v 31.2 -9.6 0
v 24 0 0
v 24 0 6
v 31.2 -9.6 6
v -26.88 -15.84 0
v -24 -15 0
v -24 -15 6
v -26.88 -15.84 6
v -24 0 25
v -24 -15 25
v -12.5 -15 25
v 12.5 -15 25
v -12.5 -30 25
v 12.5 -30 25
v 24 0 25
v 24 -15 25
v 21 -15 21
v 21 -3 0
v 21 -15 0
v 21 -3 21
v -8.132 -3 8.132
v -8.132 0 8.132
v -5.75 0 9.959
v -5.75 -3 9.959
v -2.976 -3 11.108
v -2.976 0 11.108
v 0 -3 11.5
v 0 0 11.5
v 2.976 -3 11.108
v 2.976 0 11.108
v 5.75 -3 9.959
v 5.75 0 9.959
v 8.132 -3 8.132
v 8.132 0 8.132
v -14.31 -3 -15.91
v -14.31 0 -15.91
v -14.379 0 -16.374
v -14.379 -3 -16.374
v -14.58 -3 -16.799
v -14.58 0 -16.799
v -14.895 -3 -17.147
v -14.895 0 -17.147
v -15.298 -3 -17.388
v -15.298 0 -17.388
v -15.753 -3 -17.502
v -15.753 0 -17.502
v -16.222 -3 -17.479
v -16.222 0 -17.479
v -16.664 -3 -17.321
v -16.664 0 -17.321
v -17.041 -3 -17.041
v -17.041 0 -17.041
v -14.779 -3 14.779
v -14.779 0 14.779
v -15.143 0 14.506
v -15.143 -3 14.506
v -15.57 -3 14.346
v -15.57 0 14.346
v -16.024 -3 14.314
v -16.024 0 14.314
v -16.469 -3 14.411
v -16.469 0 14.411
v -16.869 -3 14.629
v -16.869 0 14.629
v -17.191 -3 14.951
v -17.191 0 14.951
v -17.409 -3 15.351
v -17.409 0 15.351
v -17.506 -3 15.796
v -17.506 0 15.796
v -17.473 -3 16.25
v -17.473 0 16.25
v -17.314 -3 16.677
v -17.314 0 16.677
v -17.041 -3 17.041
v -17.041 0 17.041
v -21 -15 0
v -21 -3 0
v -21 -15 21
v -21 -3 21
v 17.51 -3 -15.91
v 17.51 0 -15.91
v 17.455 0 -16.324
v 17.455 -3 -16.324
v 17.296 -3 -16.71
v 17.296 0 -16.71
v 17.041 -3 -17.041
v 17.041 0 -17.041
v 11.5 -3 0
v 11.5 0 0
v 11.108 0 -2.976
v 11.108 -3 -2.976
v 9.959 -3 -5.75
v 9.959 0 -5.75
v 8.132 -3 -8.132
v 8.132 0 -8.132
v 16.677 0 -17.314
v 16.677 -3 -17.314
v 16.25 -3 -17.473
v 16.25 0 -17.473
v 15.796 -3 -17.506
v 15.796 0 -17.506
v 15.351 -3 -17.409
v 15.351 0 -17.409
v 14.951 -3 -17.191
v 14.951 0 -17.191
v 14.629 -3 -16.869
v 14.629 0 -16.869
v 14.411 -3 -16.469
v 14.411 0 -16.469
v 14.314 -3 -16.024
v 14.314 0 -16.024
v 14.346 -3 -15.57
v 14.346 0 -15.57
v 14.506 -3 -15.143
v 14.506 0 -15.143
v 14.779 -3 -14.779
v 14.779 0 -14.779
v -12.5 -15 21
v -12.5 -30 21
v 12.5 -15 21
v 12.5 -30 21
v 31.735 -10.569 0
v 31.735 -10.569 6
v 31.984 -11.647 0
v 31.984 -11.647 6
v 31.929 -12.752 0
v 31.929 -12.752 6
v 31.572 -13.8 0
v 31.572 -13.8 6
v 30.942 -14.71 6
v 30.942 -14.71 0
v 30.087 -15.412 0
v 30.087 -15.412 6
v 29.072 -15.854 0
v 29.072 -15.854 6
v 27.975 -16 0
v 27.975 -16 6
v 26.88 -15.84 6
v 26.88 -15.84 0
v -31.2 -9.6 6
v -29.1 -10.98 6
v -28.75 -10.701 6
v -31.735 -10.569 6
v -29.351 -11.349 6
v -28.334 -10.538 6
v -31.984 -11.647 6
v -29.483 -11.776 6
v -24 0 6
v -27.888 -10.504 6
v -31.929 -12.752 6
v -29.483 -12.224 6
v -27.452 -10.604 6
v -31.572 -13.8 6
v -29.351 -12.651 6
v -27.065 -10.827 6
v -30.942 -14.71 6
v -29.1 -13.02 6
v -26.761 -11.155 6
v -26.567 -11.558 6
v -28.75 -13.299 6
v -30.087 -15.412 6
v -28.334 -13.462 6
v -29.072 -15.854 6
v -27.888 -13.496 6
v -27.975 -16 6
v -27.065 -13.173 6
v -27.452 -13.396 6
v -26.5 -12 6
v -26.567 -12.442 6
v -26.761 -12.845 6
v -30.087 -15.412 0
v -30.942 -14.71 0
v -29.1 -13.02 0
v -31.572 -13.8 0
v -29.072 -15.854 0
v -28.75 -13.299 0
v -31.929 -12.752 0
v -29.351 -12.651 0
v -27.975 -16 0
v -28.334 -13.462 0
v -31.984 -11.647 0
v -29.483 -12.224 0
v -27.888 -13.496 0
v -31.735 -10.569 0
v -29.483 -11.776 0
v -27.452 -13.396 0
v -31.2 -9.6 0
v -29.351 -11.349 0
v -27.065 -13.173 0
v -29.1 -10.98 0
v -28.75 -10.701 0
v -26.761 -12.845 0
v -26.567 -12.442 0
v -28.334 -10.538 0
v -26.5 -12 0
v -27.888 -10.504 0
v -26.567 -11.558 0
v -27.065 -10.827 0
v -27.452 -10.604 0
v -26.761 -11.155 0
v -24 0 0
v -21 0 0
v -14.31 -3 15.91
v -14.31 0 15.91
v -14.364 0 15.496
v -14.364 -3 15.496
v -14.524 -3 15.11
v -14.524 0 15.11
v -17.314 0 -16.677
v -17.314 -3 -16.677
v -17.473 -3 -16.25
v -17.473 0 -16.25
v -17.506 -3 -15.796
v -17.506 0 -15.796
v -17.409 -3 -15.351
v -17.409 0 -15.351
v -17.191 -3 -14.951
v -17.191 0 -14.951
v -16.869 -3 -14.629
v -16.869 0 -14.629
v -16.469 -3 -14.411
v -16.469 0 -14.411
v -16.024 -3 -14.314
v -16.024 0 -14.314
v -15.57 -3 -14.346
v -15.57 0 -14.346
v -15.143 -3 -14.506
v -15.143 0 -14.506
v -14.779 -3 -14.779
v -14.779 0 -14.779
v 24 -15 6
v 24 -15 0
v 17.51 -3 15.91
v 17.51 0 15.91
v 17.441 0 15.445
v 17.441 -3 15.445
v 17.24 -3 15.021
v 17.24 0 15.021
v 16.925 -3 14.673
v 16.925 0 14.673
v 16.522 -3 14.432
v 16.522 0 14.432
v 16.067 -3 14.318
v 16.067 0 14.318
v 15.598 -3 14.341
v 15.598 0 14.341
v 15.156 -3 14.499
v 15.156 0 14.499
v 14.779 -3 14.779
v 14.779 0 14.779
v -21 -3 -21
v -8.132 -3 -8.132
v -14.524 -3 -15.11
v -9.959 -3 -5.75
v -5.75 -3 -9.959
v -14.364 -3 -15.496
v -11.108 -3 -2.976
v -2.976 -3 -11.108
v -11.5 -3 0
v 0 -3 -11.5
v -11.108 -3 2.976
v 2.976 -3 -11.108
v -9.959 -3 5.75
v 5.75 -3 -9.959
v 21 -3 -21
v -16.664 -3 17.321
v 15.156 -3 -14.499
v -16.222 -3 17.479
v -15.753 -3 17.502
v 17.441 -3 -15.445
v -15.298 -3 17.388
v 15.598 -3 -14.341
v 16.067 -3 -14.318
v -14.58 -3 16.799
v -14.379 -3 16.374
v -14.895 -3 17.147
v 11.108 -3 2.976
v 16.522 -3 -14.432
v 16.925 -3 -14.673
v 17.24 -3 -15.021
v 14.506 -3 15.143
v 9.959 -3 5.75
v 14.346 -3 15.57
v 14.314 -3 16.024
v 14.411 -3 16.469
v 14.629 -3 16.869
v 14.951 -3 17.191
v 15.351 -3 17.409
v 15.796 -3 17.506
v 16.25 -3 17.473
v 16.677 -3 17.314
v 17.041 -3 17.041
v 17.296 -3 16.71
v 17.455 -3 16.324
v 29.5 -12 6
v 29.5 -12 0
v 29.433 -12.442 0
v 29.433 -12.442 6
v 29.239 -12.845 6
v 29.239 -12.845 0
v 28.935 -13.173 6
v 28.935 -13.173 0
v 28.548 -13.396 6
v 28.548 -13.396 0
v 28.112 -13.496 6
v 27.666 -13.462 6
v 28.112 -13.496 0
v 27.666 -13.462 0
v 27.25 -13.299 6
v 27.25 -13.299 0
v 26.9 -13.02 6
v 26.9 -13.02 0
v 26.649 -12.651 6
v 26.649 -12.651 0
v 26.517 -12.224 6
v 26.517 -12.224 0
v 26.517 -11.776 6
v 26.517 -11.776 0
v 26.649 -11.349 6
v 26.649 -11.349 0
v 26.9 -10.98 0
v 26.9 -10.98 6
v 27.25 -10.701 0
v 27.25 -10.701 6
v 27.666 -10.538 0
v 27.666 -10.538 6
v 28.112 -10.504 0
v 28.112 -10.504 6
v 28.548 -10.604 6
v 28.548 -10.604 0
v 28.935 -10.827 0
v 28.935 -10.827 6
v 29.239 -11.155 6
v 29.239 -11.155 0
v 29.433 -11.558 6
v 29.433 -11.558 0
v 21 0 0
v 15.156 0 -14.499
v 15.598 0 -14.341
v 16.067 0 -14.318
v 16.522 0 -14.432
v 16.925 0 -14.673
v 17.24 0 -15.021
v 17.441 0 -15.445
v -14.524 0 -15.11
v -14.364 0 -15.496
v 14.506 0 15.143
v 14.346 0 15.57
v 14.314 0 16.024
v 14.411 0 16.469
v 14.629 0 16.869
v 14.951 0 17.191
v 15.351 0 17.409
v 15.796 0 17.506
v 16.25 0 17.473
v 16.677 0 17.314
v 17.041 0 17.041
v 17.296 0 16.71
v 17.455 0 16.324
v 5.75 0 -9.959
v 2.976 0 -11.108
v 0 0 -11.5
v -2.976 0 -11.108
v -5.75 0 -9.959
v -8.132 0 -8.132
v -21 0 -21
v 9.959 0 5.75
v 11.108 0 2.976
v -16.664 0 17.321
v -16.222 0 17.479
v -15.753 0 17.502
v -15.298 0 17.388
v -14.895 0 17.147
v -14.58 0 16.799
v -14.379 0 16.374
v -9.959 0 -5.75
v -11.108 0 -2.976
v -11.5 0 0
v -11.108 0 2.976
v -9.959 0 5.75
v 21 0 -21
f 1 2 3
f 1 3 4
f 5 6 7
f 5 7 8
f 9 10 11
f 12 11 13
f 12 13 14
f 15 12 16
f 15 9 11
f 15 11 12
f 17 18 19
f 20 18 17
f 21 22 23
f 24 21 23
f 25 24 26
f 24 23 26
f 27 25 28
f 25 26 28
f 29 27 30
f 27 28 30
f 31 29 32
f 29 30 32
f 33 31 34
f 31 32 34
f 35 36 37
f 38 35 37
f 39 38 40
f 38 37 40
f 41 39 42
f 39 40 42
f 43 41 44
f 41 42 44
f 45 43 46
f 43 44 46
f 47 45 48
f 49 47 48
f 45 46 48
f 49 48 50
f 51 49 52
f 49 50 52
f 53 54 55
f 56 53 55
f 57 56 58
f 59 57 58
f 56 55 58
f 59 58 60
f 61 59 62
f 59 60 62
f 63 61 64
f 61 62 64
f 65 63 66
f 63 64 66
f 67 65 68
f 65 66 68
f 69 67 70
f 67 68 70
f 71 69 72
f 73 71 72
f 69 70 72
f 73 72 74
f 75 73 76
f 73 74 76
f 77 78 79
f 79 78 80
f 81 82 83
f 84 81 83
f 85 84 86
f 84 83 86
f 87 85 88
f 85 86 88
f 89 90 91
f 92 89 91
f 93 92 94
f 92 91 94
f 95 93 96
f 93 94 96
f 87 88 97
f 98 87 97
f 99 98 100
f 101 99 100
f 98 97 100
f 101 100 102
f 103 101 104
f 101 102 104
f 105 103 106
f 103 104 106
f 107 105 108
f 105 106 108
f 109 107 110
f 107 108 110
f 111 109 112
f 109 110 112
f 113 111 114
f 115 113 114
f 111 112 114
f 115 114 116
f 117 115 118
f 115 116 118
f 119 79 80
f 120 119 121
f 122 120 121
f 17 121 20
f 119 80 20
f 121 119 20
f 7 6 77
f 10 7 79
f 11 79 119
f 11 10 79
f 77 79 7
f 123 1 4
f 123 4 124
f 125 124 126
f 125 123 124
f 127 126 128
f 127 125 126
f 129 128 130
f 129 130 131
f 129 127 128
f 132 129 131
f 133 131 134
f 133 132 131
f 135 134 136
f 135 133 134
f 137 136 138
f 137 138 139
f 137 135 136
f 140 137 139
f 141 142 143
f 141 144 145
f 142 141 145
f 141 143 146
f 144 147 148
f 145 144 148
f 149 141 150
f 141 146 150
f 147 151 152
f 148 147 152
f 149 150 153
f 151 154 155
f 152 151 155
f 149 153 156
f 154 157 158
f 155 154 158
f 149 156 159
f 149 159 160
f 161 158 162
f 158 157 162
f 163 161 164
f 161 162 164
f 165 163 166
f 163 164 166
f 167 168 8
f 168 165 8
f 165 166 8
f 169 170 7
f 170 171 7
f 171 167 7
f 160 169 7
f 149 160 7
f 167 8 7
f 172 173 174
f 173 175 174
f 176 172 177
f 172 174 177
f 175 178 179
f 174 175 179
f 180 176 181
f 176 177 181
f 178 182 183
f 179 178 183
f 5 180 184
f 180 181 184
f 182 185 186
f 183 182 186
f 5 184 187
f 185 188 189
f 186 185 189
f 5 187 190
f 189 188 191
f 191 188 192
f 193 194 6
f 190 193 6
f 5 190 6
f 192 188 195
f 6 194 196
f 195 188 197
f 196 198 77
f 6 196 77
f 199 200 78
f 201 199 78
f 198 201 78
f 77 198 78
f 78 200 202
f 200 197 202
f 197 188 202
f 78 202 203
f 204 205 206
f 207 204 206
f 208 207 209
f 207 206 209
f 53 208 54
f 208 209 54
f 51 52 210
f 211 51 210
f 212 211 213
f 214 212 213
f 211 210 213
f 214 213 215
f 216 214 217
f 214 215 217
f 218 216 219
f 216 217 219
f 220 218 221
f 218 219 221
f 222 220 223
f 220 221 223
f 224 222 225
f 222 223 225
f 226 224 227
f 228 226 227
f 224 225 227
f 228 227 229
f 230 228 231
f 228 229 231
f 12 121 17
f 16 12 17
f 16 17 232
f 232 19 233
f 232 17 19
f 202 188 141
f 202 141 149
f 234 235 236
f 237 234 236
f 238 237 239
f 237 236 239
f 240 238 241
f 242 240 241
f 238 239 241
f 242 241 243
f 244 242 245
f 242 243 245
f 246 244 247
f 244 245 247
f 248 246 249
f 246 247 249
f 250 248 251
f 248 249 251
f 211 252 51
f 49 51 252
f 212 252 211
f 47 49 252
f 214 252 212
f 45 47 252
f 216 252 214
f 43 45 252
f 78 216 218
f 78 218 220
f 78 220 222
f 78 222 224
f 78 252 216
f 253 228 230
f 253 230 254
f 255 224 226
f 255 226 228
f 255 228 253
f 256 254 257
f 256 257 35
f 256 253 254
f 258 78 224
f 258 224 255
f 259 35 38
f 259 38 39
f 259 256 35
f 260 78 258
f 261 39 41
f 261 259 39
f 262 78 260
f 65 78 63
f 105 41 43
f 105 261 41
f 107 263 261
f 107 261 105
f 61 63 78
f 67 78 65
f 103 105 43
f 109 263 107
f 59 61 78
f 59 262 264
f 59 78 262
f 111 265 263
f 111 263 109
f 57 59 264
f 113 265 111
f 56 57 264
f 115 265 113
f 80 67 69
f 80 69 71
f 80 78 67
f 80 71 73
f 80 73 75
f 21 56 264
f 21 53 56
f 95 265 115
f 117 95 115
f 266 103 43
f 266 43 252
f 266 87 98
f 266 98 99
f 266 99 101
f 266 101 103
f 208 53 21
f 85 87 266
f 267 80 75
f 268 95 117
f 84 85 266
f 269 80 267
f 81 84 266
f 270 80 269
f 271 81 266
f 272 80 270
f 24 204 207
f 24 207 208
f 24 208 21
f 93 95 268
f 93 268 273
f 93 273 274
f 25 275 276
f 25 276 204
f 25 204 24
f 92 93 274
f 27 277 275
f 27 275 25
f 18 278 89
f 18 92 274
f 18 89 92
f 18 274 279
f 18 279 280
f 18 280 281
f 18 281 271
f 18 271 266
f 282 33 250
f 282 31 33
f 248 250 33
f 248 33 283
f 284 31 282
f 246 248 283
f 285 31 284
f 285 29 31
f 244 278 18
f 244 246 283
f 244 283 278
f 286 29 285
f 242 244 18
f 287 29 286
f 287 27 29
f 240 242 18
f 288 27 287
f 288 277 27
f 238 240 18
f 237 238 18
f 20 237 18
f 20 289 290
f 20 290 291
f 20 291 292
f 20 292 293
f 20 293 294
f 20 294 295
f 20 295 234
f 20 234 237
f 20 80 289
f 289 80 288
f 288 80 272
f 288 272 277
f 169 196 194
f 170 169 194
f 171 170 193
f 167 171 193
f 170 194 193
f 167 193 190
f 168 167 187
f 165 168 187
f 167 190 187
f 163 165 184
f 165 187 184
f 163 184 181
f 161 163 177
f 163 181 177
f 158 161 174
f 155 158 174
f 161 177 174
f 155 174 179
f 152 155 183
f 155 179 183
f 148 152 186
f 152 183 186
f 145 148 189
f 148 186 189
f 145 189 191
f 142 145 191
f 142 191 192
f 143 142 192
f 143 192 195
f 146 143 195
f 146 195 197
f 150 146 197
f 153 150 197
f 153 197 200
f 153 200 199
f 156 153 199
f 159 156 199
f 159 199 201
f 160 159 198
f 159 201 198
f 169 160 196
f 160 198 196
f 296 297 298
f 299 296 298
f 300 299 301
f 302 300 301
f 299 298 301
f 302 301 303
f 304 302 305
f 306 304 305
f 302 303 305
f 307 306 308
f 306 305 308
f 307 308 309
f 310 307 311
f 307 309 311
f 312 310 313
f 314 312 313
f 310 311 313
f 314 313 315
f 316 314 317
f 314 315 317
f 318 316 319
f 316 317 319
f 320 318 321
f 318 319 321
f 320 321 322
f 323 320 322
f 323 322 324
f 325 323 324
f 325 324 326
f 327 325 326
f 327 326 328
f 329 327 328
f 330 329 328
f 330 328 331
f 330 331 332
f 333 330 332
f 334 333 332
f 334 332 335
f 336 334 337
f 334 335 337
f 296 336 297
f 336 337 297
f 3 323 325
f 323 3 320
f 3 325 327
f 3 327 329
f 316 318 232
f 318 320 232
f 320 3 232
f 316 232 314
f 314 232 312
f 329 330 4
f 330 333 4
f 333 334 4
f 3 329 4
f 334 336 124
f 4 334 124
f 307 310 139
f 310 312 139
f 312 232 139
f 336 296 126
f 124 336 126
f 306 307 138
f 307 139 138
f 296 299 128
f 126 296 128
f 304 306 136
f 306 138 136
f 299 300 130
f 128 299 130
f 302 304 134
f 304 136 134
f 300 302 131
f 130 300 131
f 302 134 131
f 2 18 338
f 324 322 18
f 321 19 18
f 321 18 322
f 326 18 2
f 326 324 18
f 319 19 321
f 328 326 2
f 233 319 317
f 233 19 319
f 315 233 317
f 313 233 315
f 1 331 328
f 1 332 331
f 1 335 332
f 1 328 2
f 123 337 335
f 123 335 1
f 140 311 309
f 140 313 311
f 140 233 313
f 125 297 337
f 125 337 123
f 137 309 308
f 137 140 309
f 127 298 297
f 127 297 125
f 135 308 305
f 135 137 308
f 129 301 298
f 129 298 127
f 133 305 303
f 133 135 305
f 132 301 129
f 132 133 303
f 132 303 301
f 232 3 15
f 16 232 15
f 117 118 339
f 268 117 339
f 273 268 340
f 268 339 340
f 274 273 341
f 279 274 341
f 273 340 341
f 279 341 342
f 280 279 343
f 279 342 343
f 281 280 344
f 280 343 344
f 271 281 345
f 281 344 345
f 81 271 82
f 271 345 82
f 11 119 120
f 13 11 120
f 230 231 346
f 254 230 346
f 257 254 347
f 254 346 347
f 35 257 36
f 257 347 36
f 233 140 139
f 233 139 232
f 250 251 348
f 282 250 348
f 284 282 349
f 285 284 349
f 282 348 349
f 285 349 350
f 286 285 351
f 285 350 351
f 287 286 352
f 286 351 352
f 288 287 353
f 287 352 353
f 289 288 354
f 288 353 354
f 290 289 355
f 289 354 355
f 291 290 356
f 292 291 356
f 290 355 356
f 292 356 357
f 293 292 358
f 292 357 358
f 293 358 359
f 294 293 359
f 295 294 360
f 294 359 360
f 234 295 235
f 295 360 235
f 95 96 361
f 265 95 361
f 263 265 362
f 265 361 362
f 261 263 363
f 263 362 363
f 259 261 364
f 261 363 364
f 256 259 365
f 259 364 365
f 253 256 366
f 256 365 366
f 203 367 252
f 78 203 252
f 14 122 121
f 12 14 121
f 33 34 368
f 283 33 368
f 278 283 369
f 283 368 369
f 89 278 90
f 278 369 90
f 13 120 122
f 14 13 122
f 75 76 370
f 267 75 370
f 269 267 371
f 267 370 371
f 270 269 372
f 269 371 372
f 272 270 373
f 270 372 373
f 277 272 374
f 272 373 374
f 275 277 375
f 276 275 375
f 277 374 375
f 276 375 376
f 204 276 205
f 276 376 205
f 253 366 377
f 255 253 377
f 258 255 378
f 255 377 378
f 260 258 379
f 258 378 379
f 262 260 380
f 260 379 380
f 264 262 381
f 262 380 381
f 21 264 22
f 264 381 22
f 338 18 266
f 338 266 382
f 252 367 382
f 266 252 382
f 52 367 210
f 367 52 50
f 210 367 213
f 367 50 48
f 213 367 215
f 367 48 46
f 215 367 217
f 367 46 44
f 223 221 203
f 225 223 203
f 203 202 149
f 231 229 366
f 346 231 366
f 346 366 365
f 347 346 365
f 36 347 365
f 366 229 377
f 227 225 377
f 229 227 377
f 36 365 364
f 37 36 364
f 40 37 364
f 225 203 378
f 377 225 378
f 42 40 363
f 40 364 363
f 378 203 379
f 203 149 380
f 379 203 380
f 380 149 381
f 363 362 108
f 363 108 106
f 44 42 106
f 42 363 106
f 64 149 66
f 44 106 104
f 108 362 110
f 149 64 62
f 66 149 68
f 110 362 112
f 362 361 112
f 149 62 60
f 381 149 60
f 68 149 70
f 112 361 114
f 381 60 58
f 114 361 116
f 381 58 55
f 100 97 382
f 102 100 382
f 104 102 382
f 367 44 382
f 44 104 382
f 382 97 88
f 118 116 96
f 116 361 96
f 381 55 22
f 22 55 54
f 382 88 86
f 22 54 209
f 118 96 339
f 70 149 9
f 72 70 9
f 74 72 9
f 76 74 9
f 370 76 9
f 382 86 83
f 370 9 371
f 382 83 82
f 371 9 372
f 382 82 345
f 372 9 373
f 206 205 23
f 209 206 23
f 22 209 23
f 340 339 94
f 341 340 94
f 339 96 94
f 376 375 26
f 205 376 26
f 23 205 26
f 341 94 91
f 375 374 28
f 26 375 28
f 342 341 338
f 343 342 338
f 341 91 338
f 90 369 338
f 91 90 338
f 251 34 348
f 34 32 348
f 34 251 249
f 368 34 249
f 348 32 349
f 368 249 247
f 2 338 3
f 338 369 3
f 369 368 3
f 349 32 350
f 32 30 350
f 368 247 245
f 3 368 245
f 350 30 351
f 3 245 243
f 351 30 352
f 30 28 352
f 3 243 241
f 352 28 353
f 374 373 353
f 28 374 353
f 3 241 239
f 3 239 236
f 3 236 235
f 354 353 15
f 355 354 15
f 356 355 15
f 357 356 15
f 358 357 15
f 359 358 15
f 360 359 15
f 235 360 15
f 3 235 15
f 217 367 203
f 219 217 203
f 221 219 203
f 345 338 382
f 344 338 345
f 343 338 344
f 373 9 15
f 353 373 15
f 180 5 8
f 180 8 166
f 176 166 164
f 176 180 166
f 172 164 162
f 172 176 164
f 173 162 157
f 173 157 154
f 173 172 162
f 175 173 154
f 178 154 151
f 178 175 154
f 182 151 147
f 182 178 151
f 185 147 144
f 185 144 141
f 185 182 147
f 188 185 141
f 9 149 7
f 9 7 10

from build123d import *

# Parameters (mm, degrees)
F1_DEPTH = 3
F4_DEPTH = 4
F5_W     = 3
F5_H     = 25
F6_DEPTH = 15
F8_R     = 1.5
F9_DEPTH = 6


with BuildPart() as f1:
    # F0 (on Front) → F1 (new body)
    with BuildSketch(Plane.XZ):
        with BuildLine():
            Line((-17.0412734266, 17.0412734266), (-21, 21))
            Line((-21, 21), (-21, -21))
            Line((-21, -21), (-17.0412734266, -17.0412734266))
            ThreePointArc((-17.0412734266, -17.0412734266), (-17.0412734266, -14.7785317268), (-14.7785317268, -14.7785317268))
            Line((-14.7785317268, -14.7785317268), (-8.1317279836, -8.1317279836))
            ThreePointArc((-8.1317279836, -8.1317279836), (-11.5, 0), (-8.1317279836, 8.1317279836))
            Line((-8.1317279836, 8.1317279836), (-14.7785317268, 14.7785317268))
            ThreePointArc((-14.7785317268, 14.7785317268), (-17.0412734266, 14.7785317268), (-17.0412734266, 17.0412734266))
        make_face()
        with BuildLine():
            Line((21, 21), (-21, 21))
            Line((-21, 21), (-17.0412734266, 17.0412734266))
            ThreePointArc((-17.0412734266, 17.0412734266), (-15.2976090849, 17.3881098287), (-14.3099025767, 15.9099025767))
            ThreePointArc((-14.3099025767, 15.9099025767), (-14.4316953247, 15.2976090849), (-14.7785317268, 14.7785317268))
            Line((-14.7785317268, 14.7785317268), (-8.1317279836, 8.1317279836))
            ThreePointArc((-8.1317279836, 8.1317279836), (0, 11.5), (8.1317279836, 8.1317279836))
            Line((8.1317279836, 8.1317279836), (14.7785317268, 14.7785317268))
            ThreePointArc((14.7785317268, 14.7785317268), (14.7785317268, 17.0412734266), (17.0412734266, 17.0412734266))
            Line((17.0412734266, 17.0412734266), (21, 21))
        make_face()
        with BuildLine():
            Line((21, -21), (21, 21))
            Line((21, 21), (17.0412734266, 17.0412734266))
            ThreePointArc((17.0412734266, 17.0412734266), (17.3881098287, 16.5221960685), (17.5099025767, 15.9099025767))
            ThreePointArc((17.5099025767, 15.9099025767), (16.5221960685, 14.4316953247), (14.7785317268, 14.7785317268))
            Line((14.7785317268, 14.7785317268), (8.1317279836, 8.1317279836))
            ThreePointArc((8.1317279836, 8.1317279836), (10.6246146239, 4.4008594722), (11.5, 0))
            ThreePointArc((11.5, 0), (10.6246146239, -4.4008594722), (8.1317279836, -8.1317279836))
            Line((8.1317279836, -8.1317279836), (14.7785317268, -14.7785317268))
            ThreePointArc((14.7785317268, -14.7785317268), (16.5221960685, -14.4316953247), (17.5099025767, -15.9099025767))
            ThreePointArc((17.5099025767, -15.9099025767), (17.3881098287, -16.5221960685), (17.0412734266, -17.0412734266))
            Line((17.0412734266, -17.0412734266), (21, -21))
        make_face()
        with BuildLine():
            Line((-17.0412734266, -17.0412734266), (-21, -21))
            Line((-21, -21), (21, -21))
            Line((21, -21), (17.0412734266, -17.0412734266))
            ThreePointArc((17.0412734266, -17.0412734266), (14.7785317268, -17.0412734266), (14.7785317268, -14.7785317268))
            Line((14.7785317268, -14.7785317268), (8.1317279836, -8.1317279836))
            ThreePointArc((8.1317279836, -8.1317279836), (0, -11.5), (-8.1317279836, -8.1317279836))
            Line((-8.1317279836, -8.1317279836), (-14.7785317268, -14.7785317268))
            ThreePointArc((-14.7785317268, -14.7785317268), (-14.4316953247, -15.2976090849), (-14.3099025767, -15.9099025767))
            ThreePointArc((-14.3099025767, -15.9099025767), (-15.2976090849, -17.3881098287), (-17.0412734266, -17.0412734266))
        make_face()
    extrude(amount=F1_DEPTH)

    # F3 (on offset) → F4 (join)
    with BuildSketch(Plane.XY.offset(21)):
        Polygon((0, 0), (-21, 0), (-21, -15), (-12.5, -15), (-12.5, -30), (0, -30), align=None)
        Polygon((21, 0), (0, 0), (0, -30), (12.5, -30), (12.5, -15), (21, -15), align=None)
    extrude(amount=F4_DEPTH)

    # F5 (on Front) → F6 (join)
    with BuildSketch(Plane.XZ):
        with Locations((-22.5, 12.5)):
            Rectangle(F5_W, F5_H)
        with Locations((22.5, 12.5)):
            Rectangle(F5_W, F5_H)
    extrude(amount=F6_DEPTH)

    # F8 (on offset) → F9 (join)
    with BuildSketch(Plane(origin=(0, 0, 0), x_dir=(1, 0, 0), z_dir=(0, 0, -1))):
        with BuildLine():
            Line((24, 0), (31.2, 9.6))
            ThreePointArc((31.2, 9.6), (31.2887687666, 14.2768399153), (26.88, 15.84))
            Line((26.88, 15.84), (24, 15))
            Line((24, 15), (24, 0))
        make_face()
        with Locations((28, 12)):
            Circle(F8_R, mode=Mode.SUBTRACT)
        with BuildLine():
            Line((-24, 0), (-24, 15))
            Line((-24, 15), (-26.88, 15.84))
            ThreePointArc((-26.88, 15.84), (-31.2887687666, 14.2768399153), (-31.2, 9.6))
            Line((-31.2, 9.6), (-24, 0))
        make_face()
        with Locations((-28, 12)):
            Circle(F8_R, mode=Mode.SUBTRACT)
    extrude(amount=-F9_DEPTH)


solid = f1.part
